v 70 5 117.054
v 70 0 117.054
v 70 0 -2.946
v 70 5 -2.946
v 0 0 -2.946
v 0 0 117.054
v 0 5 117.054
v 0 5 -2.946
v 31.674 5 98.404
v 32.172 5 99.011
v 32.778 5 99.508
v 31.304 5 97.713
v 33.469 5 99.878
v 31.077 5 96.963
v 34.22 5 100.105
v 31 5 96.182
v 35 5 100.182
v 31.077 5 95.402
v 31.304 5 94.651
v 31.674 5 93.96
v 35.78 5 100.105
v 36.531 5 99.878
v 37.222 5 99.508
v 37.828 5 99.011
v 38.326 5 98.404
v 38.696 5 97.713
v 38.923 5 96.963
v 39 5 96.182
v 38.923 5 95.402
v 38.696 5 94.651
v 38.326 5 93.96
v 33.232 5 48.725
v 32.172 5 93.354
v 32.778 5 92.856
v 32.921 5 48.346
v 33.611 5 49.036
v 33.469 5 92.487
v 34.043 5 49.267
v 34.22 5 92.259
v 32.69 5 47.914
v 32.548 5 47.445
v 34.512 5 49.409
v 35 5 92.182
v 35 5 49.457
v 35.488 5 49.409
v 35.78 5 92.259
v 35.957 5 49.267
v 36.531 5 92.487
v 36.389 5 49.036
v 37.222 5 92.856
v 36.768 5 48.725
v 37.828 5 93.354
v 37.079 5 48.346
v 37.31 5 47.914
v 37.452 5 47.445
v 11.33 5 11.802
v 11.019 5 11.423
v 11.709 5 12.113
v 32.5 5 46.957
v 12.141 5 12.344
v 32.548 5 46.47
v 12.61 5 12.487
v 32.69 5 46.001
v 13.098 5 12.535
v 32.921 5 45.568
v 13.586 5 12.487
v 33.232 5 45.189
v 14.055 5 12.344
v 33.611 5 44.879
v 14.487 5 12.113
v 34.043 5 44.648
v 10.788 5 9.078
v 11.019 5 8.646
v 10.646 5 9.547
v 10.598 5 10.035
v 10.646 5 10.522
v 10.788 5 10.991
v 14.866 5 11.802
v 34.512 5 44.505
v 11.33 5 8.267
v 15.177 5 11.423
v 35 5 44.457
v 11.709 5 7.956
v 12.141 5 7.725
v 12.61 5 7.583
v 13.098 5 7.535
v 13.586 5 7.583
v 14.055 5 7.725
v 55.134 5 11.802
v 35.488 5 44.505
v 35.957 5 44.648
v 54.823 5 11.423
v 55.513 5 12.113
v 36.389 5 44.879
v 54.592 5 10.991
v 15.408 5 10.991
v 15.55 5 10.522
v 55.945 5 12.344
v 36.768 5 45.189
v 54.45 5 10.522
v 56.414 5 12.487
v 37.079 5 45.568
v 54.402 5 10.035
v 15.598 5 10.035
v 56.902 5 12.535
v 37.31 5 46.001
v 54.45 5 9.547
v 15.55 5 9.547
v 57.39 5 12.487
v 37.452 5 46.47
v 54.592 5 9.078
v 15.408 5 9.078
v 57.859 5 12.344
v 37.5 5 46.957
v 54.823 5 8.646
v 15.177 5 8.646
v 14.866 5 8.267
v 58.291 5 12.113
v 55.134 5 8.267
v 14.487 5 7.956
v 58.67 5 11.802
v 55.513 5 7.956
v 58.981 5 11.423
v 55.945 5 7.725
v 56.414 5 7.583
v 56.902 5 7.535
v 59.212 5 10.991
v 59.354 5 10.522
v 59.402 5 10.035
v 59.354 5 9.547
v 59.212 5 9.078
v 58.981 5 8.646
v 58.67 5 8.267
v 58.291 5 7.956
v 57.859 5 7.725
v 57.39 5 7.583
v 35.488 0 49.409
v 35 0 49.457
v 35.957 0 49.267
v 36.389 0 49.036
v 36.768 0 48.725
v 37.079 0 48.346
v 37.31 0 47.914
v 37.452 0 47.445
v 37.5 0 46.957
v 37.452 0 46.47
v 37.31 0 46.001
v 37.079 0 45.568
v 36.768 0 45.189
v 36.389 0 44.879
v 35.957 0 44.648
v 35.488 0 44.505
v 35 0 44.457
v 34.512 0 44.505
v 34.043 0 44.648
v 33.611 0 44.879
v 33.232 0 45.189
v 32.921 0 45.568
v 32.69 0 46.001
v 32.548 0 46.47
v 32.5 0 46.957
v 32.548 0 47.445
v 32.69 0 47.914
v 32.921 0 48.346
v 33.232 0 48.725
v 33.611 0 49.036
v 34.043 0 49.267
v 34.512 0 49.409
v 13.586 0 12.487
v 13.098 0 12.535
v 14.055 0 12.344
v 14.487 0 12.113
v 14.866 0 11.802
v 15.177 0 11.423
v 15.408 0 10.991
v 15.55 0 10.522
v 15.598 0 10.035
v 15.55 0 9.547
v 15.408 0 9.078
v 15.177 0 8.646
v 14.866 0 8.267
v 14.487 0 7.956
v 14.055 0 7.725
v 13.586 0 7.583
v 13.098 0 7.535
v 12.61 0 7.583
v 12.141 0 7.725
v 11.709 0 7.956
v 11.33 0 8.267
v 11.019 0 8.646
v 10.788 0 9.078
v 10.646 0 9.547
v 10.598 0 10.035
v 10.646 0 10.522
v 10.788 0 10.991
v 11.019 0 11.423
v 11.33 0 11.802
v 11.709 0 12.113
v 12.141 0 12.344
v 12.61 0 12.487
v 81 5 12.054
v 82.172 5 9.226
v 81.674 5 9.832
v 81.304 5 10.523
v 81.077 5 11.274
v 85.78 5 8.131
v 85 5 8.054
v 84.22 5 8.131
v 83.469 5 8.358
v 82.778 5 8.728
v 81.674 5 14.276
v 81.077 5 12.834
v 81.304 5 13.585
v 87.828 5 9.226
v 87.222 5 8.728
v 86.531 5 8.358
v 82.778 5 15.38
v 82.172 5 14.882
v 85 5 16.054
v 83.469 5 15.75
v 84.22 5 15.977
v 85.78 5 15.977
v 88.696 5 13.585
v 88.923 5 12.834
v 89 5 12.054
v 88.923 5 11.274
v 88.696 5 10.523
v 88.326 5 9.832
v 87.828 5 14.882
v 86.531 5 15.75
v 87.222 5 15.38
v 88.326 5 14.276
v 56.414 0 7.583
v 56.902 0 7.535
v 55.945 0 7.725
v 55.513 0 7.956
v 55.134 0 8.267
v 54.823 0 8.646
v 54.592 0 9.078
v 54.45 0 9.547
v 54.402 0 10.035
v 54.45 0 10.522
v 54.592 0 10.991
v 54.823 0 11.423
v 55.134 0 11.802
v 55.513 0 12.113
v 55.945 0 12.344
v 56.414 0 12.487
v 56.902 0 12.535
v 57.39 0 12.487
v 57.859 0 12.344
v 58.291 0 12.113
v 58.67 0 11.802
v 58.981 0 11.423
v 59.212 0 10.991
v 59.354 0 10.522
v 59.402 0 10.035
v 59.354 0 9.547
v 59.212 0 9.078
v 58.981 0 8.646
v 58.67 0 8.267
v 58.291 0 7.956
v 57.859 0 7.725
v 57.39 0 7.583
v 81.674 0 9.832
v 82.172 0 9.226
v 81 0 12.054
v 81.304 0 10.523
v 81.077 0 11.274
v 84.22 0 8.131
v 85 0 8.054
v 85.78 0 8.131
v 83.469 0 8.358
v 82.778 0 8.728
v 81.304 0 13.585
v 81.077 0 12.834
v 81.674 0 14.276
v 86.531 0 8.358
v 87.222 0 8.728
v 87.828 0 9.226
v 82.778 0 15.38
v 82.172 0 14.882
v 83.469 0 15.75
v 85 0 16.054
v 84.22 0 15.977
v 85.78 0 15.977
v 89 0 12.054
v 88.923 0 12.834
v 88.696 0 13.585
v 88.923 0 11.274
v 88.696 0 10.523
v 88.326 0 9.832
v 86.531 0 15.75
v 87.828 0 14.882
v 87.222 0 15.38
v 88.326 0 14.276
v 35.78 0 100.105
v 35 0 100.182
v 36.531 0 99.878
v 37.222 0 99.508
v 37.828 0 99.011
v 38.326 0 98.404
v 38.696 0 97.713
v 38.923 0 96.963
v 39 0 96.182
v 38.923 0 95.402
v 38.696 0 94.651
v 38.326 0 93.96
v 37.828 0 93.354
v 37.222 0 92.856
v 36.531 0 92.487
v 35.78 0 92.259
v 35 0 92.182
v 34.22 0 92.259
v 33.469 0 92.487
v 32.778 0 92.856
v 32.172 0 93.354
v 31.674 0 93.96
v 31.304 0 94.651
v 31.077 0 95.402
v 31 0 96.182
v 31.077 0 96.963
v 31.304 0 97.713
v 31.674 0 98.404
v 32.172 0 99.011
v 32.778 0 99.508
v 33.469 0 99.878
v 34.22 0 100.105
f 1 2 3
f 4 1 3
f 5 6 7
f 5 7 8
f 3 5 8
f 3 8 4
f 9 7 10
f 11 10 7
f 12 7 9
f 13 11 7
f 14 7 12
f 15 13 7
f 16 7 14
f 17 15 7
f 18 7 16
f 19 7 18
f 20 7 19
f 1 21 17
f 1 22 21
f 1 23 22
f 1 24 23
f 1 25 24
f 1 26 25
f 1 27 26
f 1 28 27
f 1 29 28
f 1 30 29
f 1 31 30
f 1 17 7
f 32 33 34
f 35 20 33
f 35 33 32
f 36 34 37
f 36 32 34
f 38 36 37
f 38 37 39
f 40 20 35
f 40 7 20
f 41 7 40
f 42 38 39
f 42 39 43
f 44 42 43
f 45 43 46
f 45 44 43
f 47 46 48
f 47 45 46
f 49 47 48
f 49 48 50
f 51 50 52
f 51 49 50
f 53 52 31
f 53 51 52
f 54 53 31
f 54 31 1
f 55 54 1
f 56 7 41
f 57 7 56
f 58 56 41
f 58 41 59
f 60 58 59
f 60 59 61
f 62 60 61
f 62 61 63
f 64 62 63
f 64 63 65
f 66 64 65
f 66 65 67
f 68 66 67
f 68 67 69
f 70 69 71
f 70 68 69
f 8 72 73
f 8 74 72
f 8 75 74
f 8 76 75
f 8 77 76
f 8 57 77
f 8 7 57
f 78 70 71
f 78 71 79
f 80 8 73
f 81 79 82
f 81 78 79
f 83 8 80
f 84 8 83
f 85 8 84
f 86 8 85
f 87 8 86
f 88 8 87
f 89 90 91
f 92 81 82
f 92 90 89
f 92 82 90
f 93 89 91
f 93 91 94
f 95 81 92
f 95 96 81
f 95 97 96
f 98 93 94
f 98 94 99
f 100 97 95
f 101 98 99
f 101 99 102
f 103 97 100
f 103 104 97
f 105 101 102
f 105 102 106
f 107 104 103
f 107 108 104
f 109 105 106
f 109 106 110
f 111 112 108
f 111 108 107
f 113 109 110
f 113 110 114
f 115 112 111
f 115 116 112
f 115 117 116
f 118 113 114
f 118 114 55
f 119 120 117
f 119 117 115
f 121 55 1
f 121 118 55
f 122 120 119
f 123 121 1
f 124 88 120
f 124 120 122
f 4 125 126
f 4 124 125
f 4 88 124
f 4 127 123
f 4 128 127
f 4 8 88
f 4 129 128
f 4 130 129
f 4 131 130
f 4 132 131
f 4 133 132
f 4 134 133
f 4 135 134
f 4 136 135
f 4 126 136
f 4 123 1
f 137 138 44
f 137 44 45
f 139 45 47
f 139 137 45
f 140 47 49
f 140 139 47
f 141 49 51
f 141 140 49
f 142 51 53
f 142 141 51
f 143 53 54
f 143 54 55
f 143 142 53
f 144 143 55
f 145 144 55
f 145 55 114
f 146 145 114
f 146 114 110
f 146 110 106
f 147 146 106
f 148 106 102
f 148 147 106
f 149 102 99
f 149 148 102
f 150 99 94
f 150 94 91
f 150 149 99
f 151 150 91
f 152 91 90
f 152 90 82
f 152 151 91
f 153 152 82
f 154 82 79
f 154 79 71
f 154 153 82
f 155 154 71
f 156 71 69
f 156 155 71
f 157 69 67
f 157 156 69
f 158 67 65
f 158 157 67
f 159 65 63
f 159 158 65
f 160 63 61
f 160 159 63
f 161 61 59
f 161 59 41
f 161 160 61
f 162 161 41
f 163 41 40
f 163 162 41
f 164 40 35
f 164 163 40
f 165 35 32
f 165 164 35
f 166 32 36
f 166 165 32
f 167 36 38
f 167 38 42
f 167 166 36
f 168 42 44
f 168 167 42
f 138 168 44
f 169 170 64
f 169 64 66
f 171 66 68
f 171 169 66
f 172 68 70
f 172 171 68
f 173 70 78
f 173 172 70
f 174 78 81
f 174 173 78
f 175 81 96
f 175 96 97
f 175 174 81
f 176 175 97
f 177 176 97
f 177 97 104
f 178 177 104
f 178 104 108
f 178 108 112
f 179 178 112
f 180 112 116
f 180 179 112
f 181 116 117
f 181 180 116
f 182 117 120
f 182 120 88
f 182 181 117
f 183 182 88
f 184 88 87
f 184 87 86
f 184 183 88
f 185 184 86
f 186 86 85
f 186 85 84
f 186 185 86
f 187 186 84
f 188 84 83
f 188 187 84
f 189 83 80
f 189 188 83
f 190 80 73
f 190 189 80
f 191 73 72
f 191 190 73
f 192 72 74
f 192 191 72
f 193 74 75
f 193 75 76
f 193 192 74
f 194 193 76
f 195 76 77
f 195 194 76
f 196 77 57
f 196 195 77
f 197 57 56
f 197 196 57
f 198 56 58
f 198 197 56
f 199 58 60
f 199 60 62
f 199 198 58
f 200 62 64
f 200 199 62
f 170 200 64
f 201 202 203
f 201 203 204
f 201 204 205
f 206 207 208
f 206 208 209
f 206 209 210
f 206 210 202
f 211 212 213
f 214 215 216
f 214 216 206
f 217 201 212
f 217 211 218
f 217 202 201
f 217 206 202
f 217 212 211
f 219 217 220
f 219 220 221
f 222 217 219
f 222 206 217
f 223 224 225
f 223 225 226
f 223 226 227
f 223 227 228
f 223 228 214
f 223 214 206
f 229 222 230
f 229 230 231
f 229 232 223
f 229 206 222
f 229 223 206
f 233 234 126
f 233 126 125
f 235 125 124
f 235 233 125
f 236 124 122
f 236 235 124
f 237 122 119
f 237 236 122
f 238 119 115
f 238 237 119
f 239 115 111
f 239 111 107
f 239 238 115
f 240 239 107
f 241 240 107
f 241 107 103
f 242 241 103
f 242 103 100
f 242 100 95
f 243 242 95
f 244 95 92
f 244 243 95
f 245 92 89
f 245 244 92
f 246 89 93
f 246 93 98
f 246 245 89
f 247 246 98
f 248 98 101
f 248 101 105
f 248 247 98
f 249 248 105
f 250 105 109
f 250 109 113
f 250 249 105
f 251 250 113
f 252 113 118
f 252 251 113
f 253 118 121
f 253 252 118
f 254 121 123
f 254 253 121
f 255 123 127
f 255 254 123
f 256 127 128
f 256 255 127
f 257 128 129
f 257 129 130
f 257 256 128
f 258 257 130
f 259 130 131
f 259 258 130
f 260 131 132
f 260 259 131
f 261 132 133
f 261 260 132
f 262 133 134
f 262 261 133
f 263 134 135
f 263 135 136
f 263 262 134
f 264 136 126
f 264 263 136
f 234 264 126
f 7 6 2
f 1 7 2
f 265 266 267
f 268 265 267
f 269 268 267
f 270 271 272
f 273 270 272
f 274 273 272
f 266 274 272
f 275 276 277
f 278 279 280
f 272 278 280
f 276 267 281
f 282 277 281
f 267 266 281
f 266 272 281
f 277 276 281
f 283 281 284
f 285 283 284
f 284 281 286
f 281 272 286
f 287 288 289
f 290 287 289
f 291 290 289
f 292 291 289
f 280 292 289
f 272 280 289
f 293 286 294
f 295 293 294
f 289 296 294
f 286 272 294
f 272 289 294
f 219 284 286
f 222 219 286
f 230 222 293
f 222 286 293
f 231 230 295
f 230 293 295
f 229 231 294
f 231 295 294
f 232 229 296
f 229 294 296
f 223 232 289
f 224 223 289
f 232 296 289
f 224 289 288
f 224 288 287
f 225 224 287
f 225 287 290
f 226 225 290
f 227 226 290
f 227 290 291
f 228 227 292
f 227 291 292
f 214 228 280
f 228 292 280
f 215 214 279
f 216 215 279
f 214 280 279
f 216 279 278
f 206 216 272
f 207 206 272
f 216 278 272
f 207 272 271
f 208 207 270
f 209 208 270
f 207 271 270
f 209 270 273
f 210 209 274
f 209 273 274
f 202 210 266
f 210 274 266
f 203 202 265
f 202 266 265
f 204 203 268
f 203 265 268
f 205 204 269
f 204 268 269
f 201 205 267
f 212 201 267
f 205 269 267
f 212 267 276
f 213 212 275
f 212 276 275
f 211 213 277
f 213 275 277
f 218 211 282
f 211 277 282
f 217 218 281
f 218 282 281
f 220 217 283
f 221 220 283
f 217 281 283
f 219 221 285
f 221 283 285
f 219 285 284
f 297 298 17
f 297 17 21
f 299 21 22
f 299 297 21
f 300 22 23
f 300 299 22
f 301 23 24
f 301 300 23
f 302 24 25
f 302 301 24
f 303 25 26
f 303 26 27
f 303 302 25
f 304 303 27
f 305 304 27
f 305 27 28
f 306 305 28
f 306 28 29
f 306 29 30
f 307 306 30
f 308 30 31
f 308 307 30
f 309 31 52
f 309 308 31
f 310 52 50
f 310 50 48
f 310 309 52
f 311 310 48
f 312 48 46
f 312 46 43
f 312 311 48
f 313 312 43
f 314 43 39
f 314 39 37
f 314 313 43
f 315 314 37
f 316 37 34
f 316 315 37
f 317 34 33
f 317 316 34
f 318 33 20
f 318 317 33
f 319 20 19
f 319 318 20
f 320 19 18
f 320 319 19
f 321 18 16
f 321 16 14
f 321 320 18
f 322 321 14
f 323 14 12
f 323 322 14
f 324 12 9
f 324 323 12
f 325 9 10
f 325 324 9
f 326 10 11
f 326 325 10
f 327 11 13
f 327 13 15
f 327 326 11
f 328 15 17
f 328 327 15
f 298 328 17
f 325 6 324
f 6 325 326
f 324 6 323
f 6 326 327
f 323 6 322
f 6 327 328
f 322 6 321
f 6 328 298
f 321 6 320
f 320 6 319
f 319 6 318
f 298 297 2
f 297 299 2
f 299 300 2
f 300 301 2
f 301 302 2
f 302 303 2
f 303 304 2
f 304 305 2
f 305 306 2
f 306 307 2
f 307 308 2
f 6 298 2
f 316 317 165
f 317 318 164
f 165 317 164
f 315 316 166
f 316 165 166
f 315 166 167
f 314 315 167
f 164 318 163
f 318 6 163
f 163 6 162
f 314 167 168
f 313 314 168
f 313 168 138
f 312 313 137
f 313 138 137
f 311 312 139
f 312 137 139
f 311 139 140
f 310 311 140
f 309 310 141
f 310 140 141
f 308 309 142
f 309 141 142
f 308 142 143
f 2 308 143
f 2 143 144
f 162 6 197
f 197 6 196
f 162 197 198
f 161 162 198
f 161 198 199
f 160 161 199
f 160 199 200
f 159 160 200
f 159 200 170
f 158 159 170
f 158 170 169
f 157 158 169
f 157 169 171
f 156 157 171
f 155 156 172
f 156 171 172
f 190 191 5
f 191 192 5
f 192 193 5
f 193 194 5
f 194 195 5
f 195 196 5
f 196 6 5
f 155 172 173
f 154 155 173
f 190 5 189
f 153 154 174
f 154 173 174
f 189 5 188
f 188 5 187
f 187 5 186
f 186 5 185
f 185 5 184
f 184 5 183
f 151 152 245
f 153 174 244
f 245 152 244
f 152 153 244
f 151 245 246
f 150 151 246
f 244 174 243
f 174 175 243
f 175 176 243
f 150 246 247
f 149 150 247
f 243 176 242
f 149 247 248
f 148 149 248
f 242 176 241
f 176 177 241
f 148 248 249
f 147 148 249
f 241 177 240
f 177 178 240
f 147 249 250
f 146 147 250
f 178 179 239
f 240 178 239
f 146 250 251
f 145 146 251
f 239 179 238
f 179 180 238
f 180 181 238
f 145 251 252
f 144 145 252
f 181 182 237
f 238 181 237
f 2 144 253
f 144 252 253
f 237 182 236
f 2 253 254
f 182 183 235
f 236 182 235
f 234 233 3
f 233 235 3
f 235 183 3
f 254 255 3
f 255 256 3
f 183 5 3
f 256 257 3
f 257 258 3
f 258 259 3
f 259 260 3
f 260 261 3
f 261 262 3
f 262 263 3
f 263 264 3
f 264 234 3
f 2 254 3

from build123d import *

# Parameters (mm, degrees)
SKETCH1_R             = 4
BOSS_EXTRUDE1_DEPTH   = 5
SKETCH1_W             = 70
SKETCH1_H             = 120
SKETCH1_R_2           = 2.5
BOSS_EXTRUDE1_2_DEPTH = 5


with BuildPart() as part:
    # Sketch1 → Boss-Extrude1 (new body)
    with BuildSketch(Plane(origin=(0, 0, 0), x_dir=(1, 0, 0), z_dir=(0, 1, 0))):
        with Locations(Location((85, -12.05400982, 0), (0, 0, 270))):
            Circle(SKETCH1_R)
    extrude(amount=BOSS_EXTRUDE1_DEPTH)


with BuildPart() as body_2:
    # Sketch1 → Boss-Extrude1 2 (new body)
    with BuildSketch(Plane(origin=(0, 0, 0), x_dir=(1, 0, 0), z_dir=(0, 1, 0))):
        with Locations((35, -57.05400982)):
            Rectangle(SKETCH1_W, SKETCH1_H)
        with Locations(Location((13.097845213, -10.034574012, 0), (0, 0, 270))):
            Circle(SKETCH1_R_2, mode=Mode.SUBTRACT)
        with Locations(Location((56.902154787, -10.034574012, 0), (0, 0, 90))):
            Circle(SKETCH1_R_2, mode=Mode.SUBTRACT)
        with Locations(Location((35, -46.957253621, 0), (0, 0, 270))):
            Circle(SKETCH1_R_2, mode=Mode.SUBTRACT)
        with Locations(Location((35, -96.182185262, 0), (0, 0, 270))):
            Circle(SKETCH1_R, mode=Mode.SUBTRACT)
    extrude(amount=BOSS_EXTRUDE1_2_DEPTH)


solid = Compound([part.part, body_2.part])
